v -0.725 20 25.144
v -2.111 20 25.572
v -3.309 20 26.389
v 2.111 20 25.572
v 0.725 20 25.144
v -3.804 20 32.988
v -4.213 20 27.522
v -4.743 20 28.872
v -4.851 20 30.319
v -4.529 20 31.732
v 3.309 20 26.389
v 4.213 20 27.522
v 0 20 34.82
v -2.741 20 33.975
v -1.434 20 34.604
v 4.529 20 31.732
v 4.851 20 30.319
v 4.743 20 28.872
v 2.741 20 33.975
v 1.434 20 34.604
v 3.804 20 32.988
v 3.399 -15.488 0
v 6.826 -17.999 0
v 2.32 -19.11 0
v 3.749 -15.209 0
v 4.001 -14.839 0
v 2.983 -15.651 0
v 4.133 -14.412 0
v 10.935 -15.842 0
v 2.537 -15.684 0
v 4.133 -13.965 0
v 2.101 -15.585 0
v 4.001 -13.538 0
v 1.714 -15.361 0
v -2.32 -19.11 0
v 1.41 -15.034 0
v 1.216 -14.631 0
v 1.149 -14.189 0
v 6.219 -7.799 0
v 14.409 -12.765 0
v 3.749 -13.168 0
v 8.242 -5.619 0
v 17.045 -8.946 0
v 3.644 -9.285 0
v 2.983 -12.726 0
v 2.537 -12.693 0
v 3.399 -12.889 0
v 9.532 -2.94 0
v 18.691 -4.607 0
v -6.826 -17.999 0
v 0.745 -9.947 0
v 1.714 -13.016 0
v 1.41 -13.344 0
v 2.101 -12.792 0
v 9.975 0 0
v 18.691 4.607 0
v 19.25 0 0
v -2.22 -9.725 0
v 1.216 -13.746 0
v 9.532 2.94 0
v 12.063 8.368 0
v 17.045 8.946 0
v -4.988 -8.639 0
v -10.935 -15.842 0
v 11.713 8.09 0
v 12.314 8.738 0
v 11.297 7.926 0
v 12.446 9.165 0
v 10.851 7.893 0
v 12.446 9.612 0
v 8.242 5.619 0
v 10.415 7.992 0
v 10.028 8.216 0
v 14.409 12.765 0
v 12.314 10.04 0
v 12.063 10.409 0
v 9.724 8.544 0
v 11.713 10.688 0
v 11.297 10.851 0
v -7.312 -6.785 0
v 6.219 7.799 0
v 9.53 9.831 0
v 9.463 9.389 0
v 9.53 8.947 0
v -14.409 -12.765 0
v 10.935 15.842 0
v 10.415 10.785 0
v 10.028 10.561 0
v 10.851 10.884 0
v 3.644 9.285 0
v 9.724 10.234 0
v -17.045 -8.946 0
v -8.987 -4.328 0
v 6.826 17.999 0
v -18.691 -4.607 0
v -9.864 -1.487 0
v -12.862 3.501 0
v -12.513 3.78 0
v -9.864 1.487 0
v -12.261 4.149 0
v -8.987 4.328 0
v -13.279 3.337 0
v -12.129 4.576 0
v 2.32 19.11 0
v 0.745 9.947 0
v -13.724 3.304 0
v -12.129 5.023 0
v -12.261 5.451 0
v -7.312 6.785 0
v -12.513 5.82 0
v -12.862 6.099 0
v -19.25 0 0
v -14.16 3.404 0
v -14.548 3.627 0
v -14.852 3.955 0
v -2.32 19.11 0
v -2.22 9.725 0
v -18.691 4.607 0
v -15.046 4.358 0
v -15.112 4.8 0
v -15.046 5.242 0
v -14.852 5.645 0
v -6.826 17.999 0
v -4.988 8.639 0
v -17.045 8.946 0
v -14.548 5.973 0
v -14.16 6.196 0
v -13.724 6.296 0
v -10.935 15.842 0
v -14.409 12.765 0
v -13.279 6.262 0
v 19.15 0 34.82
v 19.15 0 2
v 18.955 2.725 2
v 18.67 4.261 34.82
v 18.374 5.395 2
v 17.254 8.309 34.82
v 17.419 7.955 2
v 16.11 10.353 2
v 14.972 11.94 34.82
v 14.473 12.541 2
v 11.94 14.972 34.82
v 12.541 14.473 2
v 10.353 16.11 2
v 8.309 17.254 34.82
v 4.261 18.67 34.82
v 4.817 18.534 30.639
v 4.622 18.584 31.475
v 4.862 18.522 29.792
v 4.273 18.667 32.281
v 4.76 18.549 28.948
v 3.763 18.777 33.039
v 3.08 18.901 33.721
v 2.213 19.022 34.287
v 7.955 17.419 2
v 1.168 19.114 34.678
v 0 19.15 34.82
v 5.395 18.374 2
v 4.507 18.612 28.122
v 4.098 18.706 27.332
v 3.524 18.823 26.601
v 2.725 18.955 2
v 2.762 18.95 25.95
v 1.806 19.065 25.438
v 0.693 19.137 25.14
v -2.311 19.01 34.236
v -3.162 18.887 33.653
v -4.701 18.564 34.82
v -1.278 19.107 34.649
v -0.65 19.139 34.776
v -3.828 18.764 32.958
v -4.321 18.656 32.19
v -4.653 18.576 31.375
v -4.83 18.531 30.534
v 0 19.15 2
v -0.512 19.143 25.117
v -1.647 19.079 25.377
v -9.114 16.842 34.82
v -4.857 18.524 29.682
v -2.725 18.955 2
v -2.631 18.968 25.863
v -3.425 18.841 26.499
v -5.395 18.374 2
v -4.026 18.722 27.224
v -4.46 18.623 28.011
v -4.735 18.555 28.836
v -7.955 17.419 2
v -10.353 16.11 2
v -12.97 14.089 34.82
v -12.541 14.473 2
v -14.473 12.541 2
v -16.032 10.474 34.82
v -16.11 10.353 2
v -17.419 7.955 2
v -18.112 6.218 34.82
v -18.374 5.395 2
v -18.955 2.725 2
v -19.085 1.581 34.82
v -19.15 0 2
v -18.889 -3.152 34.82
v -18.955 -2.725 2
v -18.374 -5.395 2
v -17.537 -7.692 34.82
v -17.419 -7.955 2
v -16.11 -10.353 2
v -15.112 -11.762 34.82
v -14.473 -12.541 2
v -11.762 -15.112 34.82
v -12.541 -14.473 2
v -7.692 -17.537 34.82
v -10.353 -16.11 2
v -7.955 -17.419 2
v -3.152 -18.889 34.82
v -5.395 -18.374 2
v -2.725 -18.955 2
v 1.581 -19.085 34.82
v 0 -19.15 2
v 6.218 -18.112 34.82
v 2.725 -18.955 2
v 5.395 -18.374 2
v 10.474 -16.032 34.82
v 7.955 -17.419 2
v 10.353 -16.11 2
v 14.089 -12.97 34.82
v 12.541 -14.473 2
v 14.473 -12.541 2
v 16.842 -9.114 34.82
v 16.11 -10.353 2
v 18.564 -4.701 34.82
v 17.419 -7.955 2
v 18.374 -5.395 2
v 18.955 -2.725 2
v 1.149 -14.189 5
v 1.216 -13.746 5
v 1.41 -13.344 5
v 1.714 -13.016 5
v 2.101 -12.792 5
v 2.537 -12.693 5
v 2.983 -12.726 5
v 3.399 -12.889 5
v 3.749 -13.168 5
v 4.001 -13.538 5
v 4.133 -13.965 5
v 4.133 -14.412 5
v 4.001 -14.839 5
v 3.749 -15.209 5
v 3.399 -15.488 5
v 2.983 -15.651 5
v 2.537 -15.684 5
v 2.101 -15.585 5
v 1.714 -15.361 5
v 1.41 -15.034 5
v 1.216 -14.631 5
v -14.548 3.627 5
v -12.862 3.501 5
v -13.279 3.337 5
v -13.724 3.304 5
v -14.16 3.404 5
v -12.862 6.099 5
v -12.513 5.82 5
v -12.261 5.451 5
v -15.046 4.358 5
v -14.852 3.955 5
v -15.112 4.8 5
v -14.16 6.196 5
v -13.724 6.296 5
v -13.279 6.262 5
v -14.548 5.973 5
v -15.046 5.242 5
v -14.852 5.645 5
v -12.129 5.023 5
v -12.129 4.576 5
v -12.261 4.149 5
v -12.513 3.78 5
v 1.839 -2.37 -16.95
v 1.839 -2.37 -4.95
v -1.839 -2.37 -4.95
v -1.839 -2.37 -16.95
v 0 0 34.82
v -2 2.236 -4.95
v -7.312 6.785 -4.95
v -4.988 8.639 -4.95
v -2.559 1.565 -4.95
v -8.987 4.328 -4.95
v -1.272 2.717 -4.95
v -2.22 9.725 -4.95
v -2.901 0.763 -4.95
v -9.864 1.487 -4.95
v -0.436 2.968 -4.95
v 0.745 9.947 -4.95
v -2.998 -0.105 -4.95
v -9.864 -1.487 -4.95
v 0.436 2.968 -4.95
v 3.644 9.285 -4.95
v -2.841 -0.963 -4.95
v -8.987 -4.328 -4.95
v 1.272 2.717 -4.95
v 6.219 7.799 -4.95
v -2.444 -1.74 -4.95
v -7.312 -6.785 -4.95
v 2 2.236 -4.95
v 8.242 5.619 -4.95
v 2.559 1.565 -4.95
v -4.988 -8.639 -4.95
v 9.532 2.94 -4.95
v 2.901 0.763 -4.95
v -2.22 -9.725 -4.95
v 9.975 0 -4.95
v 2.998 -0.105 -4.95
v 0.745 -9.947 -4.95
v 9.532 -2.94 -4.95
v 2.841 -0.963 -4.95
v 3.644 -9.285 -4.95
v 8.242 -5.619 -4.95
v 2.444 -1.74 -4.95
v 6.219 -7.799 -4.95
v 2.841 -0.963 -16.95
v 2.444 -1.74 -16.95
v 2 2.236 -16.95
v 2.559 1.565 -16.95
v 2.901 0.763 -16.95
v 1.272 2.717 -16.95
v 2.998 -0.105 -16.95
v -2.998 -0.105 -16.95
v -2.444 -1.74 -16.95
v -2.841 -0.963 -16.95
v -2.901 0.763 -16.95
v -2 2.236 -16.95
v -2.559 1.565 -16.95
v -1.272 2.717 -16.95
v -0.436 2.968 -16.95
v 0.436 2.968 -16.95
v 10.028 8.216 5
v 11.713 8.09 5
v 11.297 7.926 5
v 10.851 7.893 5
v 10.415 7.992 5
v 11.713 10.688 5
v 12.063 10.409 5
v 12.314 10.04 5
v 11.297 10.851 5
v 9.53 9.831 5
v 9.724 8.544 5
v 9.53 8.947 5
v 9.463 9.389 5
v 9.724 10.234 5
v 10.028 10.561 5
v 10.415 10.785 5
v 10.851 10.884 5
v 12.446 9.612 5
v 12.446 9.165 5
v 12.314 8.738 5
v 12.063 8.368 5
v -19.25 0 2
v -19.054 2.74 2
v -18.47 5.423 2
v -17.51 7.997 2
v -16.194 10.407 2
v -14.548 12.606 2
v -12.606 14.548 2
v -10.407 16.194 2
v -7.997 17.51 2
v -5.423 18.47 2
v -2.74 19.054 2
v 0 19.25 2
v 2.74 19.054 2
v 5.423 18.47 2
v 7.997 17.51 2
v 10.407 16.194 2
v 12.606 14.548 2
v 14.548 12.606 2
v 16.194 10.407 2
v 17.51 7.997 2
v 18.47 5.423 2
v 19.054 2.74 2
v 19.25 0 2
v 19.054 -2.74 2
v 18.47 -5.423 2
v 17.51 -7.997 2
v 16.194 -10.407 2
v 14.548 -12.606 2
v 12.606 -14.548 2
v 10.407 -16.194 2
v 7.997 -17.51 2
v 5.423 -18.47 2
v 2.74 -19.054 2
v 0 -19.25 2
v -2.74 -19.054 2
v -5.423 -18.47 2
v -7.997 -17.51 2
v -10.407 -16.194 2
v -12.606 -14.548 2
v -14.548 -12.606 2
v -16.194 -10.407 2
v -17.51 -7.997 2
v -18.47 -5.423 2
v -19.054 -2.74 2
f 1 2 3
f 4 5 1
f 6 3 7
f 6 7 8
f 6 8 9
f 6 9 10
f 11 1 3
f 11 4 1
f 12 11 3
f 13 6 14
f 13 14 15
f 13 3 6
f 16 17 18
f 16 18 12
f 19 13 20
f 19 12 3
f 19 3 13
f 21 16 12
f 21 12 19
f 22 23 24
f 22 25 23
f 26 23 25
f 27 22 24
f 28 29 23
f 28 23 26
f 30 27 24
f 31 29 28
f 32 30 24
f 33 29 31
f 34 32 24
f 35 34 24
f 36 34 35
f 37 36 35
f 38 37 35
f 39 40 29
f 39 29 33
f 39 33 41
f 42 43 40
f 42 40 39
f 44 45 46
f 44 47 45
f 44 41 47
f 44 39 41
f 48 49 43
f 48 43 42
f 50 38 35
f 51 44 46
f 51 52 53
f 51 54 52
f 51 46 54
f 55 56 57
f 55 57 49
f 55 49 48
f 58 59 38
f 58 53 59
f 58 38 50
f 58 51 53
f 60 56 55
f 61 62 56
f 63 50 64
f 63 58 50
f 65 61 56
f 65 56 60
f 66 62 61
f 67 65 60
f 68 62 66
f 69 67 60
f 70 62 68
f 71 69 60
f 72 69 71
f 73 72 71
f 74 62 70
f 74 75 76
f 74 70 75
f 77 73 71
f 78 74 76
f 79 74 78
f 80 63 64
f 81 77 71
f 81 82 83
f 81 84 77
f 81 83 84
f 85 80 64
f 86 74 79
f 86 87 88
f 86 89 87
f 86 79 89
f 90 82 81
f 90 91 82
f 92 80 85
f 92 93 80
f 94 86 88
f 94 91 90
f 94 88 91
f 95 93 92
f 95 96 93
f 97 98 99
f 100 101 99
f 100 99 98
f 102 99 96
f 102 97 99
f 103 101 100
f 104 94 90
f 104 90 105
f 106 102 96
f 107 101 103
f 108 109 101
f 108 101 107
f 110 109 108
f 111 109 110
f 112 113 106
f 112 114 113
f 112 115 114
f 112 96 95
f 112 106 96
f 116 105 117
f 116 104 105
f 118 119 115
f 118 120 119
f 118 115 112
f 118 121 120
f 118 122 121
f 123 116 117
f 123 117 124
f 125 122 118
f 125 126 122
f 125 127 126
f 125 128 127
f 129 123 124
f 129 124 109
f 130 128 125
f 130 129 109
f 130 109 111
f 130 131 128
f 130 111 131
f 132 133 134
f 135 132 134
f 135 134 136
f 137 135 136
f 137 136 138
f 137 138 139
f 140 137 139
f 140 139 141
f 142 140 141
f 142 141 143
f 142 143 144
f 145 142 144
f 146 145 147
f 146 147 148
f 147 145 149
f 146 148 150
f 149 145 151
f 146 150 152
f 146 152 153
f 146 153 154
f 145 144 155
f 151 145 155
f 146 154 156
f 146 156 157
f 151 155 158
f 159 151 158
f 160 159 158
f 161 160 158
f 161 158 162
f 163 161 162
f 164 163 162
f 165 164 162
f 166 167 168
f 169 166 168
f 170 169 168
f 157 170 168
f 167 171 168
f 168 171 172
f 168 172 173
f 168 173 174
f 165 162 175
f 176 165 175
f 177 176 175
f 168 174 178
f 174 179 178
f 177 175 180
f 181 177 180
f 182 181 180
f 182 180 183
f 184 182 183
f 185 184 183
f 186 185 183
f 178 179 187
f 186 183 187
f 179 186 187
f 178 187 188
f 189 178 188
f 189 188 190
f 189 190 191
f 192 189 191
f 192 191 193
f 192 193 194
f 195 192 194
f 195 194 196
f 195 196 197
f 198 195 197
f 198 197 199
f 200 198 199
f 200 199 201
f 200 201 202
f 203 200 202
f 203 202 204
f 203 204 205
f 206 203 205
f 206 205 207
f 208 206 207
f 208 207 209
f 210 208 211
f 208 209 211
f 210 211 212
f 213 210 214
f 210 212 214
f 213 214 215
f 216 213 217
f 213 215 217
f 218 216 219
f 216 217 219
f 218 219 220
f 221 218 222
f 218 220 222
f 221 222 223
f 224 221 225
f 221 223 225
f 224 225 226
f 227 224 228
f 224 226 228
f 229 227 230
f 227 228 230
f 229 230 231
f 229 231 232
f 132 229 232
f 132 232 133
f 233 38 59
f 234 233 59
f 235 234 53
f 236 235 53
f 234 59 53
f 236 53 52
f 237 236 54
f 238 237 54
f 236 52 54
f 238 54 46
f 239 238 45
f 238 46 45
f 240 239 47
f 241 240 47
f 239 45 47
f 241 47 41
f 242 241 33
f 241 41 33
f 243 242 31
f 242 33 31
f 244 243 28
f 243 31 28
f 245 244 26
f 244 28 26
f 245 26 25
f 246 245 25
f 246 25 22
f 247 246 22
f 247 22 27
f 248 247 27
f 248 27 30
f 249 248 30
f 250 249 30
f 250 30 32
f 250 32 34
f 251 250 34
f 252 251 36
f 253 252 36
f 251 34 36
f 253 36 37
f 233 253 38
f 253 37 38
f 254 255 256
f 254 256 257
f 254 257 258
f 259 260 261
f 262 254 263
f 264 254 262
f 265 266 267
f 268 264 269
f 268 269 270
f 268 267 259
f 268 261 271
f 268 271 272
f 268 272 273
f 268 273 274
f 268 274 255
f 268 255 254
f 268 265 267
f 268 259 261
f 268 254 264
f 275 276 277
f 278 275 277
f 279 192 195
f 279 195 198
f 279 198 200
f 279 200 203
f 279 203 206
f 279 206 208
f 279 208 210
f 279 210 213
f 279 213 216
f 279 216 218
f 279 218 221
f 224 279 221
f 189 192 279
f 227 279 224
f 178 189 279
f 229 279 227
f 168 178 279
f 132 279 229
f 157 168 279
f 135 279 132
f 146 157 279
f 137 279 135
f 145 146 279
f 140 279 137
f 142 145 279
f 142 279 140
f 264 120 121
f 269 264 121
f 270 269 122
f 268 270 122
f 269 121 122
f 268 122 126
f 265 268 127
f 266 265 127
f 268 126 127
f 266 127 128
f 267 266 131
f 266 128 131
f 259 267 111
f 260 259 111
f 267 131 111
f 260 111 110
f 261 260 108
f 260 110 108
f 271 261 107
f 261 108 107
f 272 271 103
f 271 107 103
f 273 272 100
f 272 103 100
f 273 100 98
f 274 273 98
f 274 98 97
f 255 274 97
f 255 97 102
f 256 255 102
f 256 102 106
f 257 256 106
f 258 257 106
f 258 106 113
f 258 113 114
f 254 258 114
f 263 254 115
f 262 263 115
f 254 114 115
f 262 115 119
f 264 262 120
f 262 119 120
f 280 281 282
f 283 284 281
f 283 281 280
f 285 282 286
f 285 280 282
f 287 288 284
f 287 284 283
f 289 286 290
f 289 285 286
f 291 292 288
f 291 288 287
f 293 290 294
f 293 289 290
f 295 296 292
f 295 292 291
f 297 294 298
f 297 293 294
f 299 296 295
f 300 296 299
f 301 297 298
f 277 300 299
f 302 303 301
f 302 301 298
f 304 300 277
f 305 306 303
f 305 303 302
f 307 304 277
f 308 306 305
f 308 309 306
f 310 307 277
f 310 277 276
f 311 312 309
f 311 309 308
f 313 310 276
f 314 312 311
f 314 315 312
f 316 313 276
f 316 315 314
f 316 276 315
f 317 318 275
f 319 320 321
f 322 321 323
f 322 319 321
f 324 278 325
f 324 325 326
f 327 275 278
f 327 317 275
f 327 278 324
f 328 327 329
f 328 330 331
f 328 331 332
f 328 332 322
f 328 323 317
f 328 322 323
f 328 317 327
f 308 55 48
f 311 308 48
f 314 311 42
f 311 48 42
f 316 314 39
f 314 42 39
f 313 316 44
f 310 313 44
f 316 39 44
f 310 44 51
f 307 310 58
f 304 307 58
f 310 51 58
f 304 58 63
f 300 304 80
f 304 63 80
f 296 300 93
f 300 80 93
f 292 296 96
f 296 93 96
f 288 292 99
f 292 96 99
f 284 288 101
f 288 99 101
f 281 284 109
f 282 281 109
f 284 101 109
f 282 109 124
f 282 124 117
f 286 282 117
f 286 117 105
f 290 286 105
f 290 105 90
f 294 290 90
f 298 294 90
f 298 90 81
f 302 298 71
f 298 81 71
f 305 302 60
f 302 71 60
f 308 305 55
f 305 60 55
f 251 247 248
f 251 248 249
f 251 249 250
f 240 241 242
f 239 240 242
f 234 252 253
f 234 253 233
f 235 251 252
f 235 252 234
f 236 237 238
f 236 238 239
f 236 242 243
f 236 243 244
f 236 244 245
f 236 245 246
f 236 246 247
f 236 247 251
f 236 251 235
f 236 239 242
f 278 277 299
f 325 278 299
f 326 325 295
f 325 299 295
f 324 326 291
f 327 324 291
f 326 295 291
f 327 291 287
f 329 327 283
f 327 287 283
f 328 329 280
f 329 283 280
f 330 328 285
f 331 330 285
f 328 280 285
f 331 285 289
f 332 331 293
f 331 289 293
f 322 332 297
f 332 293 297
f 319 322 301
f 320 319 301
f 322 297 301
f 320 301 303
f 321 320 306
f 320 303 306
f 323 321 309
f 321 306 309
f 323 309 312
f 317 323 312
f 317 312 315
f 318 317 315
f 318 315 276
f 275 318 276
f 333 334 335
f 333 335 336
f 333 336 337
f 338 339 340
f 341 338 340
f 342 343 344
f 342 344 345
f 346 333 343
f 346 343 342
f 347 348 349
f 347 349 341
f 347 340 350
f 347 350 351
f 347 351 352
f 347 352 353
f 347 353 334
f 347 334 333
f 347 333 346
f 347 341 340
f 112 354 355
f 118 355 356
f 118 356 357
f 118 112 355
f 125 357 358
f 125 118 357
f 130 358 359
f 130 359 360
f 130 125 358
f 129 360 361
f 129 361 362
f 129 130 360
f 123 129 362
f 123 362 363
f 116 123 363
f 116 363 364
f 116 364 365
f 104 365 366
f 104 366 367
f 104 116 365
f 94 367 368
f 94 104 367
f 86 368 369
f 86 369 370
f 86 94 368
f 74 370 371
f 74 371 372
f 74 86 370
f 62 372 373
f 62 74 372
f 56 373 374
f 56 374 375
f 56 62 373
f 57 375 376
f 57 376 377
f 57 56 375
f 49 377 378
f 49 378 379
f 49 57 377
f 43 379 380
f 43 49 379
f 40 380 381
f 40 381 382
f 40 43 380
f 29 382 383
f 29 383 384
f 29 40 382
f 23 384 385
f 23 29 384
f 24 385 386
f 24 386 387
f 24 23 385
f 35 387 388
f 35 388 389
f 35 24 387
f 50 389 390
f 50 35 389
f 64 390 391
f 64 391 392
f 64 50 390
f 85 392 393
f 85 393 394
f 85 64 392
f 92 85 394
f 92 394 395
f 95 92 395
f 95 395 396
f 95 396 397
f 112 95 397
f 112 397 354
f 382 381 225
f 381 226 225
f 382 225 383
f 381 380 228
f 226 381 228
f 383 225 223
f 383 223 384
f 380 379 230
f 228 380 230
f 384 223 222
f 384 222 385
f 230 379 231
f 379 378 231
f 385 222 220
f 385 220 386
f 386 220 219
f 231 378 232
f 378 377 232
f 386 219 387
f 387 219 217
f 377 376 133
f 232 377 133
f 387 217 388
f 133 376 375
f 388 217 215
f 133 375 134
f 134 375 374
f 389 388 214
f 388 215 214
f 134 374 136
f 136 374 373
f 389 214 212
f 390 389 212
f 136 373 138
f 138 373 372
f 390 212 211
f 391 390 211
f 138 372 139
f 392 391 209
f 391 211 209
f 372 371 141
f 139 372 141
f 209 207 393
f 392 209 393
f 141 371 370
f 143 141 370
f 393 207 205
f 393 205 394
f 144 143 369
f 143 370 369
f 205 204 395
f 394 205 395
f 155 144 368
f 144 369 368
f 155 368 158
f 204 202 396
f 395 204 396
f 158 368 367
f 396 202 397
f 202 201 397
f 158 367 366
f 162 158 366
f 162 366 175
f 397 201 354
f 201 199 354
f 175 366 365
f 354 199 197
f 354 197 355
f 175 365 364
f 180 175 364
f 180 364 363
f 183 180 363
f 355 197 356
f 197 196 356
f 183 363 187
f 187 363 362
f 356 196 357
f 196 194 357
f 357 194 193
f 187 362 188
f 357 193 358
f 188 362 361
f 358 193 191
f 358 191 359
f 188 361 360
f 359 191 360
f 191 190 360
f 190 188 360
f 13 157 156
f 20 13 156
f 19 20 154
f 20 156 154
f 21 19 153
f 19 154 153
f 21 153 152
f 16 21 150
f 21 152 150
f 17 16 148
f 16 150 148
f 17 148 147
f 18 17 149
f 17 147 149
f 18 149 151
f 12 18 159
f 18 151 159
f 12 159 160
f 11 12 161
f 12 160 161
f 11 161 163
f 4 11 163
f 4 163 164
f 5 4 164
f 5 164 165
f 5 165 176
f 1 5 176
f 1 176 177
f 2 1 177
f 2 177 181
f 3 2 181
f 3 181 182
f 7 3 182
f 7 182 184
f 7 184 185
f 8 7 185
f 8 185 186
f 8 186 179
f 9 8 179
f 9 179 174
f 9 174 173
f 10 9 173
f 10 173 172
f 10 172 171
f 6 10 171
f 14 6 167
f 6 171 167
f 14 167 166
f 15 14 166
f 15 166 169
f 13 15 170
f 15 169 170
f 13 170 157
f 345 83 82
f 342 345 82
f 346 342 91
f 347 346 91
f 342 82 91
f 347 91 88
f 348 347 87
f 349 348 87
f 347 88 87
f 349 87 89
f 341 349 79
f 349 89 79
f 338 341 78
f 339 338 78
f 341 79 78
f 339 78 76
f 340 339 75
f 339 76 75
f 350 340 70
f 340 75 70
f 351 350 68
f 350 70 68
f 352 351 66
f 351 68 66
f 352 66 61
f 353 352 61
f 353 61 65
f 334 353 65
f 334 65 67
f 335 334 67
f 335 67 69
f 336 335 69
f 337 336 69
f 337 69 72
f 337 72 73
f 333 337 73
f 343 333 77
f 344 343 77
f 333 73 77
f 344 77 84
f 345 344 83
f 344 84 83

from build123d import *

# Parameters (mm, degrees)
CROQUIS1_R              = 19.15
SALIENTE_EXTRUIR1_DEPTH = 34.82
CROQUIS2_R              = 9.975
SALIENTE_EXTRUIR2_DEPTH = 4.95
SALIENTE_EXTRUIR3_DEPTH = 12
CROQUIS4_R              = 4.865
SALIENTE_EXTRUIR4_DEPTH = 20
CROQUIS5_R              = 19.25
SALIENTE_EXTRUIR5_DEPTH = 2
CROQUIS6_R              = 1.5
CORTAR_EXTRUIR1_DEPTH   = 5


with BuildPart() as part:
    # Croquis1 → Saliente-Extruir1 (new body)
    with BuildSketch(Plane.XY):
        Circle(CROQUIS1_R)
    extrude(amount=SALIENTE_EXTRUIR1_DEPTH)

    # Croquis2 → Saliente-Extruir2 (add)
    with BuildSketch(Plane(origin=(0, 0, 0), x_dir=(-1, 0, 0), z_dir=(0, 0, -1))):
        with Locations(Location((0, 0, 0), (0, 0, 180))):
            Circle(CROQUIS2_R)
    extrude(amount=SALIENTE_EXTRUIR2_DEPTH)

    # Croquis3 → Saliente-Extruir3 (add)
    with BuildSketch(Plane(origin=(0, 0, -4.95), x_dir=(-1, 0, 0), z_dir=(0, 0, -1))):
        with BuildLine():
            Line((-1.839320527, -2.37), (1.839320527, -2.37))
            ThreePointArc((1.839320527, -2.37), (0, 3), (-1.839320527, -2.37))
        make_face()
    extrude(amount=SALIENTE_EXTRUIR3_DEPTH)

    # Croquis4 → Saliente-Extruir4 (add)
    with BuildSketch(Plane(origin=(0, 0, 0), x_dir=(1, 0, 0), z_dir=(0, 1, 0))):
        with Locations(Location((0, -29.955, 0), (0, 0, 270))):
            Circle(CROQUIS4_R)
    extrude(amount=SALIENTE_EXTRUIR4_DEPTH)

    # Croquis5 → Saliente-Extruir5 (add)
    with BuildSketch(Plane(origin=(0, 0, 0), x_dir=(-1, 0, 0), z_dir=(0, 0, -1))):
        Circle(CROQUIS5_R)
    extrude(amount=-SALIENTE_EXTRUIR5_DEPTH)

    # Croquis6 → Cortar-Extruir1 (cut)
    with BuildSketch(Plane(origin=(0, 0, 0), x_dir=(-1, 0, 0), z_dir=(0, 0, -1))):
        with Locations((-10.962942032, 9.38867591)):
            Circle(CROQUIS6_R)
        with Locations((13.612302862, 4.799848345)):
            Circle(CROQUIS6_R)
        with Locations((-2.64936083, -14.188524255)):
            Circle(CROQUIS6_R)
    extrude(amount=-CORTAR_EXTRUIR1_DEPTH, mode=Mode.SUBTRACT)


solid = part.part
